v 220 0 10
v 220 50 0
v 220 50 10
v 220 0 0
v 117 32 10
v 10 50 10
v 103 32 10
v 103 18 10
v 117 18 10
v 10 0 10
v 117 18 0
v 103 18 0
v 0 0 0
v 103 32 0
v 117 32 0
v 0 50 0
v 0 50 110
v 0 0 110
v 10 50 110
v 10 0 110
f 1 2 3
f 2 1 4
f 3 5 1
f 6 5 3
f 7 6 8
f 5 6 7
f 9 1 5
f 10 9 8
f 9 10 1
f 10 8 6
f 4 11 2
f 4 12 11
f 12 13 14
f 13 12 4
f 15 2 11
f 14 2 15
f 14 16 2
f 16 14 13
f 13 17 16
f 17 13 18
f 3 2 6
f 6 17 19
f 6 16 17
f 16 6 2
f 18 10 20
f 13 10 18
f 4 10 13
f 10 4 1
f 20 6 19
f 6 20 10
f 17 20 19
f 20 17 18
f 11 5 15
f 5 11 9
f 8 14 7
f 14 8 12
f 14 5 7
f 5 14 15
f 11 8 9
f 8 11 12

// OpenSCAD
$fn = 32;

// ----------------------------------------------------------------------
// Gantry bracket: 200-250 mm L bracket
// ----------------------------------------------------------------------

// --- parameters (mm) ---
base_l = 220;             // base arm length, X
arm_w = 50;               // arm width, Y
thick = 10;               // arm thickness
up_h = 100;               // vertical arm height, Z
slot_w = 14;              // adjustment slot width in the base

total_h = up_h + thick;  // overall height

difference() {
  union() {
    cube([base_l, arm_w, thick]);
    cube([thick, arm_w, total_h]);
  }
  translate([base_l / 2 - slot_w / 2, arm_w / 2 - slot_w / 2, -1])
    cube([slot_w, slot_w, thick + 2]);
}
